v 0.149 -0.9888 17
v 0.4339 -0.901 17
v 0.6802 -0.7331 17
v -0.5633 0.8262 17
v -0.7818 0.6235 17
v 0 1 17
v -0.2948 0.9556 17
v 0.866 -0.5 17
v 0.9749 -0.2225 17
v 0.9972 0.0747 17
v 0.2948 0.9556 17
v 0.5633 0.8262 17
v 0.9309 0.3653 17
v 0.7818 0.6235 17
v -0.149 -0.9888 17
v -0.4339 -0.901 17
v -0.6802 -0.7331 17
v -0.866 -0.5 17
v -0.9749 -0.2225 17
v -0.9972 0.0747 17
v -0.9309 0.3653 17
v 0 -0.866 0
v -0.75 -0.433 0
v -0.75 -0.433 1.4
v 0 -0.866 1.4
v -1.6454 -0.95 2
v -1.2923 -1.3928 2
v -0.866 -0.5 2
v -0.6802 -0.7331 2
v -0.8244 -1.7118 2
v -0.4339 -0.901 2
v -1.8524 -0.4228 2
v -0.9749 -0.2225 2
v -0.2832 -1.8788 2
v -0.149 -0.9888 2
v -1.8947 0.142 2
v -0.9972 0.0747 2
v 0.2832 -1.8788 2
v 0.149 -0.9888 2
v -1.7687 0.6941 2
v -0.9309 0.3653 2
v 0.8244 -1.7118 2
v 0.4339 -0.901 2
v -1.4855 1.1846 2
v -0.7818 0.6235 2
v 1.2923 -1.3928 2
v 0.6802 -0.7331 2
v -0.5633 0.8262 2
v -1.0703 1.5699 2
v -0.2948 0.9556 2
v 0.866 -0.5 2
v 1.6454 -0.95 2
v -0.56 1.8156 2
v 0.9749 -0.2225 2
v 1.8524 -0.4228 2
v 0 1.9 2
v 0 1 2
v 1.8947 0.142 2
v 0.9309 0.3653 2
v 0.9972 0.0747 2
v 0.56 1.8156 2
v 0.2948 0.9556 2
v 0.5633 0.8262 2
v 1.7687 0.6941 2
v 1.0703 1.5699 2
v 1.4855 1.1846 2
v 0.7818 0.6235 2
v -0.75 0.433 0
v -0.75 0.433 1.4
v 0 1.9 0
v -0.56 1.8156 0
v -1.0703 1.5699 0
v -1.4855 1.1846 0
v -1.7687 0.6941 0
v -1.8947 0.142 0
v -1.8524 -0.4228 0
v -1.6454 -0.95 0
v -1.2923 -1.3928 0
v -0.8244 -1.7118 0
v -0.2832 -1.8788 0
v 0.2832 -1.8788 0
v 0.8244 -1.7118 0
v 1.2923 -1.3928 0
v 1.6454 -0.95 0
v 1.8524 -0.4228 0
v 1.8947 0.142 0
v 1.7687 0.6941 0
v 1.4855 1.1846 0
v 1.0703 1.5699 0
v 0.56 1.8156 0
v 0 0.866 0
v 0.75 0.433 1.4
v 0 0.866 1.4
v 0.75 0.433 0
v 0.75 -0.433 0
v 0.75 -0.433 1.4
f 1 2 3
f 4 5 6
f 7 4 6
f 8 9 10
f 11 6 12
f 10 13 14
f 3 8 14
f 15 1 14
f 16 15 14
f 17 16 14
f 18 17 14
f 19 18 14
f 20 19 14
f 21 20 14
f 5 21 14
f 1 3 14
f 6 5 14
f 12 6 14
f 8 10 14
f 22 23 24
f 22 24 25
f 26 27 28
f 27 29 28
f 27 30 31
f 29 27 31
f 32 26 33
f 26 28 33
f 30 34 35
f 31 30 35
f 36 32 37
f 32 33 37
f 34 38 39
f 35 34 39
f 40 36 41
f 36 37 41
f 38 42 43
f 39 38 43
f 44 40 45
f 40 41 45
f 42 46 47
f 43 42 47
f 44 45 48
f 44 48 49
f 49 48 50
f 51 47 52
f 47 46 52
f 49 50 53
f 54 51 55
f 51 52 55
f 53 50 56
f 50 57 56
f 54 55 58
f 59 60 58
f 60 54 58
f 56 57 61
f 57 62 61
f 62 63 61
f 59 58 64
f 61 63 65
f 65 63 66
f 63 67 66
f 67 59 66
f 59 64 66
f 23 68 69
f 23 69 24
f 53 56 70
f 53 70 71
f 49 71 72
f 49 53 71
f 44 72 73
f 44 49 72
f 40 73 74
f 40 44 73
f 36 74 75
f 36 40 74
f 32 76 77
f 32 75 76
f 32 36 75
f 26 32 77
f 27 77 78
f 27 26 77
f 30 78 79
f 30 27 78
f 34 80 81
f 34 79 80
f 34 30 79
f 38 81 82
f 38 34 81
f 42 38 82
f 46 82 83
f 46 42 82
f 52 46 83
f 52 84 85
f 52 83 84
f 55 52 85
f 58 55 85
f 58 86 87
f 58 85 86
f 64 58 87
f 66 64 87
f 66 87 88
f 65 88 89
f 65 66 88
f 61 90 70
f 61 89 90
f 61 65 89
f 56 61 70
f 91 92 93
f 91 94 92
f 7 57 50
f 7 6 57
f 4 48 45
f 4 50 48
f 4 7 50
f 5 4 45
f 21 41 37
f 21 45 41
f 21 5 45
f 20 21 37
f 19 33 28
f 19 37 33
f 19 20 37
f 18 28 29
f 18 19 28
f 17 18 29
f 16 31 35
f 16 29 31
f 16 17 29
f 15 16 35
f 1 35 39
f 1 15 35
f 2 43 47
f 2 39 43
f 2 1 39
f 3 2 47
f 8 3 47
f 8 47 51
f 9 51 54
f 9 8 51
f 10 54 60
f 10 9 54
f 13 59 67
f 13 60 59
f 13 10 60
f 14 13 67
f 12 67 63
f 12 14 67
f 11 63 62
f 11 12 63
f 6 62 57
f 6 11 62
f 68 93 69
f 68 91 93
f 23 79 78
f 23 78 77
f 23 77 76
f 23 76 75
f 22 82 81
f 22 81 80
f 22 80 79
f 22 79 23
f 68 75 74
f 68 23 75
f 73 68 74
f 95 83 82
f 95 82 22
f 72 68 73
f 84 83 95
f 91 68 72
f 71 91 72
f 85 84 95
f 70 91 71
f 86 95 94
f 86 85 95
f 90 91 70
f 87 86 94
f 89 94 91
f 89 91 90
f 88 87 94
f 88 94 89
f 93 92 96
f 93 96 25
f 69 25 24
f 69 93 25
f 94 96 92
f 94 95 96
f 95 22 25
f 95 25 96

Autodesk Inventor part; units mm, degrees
ref_plane "YZ Plane" through (0, 0, 0) normal (1, 0, 0) x (0, 1, 0)
ref_plane "XZ Plane" through (0, 0, 0) normal (0, 1, 0) x (-1, 0, 0)
ref_plane "XY Plane" through (0, 0, 0) normal (0, 0, 1) x (1, 0, 0)
sketch "スケッチ1" plane through (0, 0, 0) normal (1, 0, 0) x (0, 1, 0)
  line L0 (0, 17) -> (0, 0)
  line L1 (0, 0) -> (1.9, 0)
  line L2 (1.9, 0) -> (1.9, 2)
  line L3 (1.9, 2) -> (1, 2)
  line L4 (1, 2) -> (1, 17)
  line L5 (1, 17) -> (0, 17)
  dimension "d1" = 1
  dimension "d2" = 2
  dimension "d3" = 1.9
  dimension "d10" = 15
revolve "回転1" add sketch "スケッチ1" angle 360 about axis through (0, 0, 17) along (0, 0, -1)
thread "ねじ1" size "M2x0.4" class "6g" standard "ANSI Metric M Profile" full length
sketch "スケッチ2" plane through (0, 0, 0) normal (0, 0, -1) x (-1, 0, 0)
  line L0 (0, 0.866) -> (0.75, 0.433)
  line L1 (0.75, 0.433) -> (0.75, -0.433)
  line L2 (0.75, -0.433) -> (0, -0.866)
  line L3 (0, -0.866) -> (-0.75, -0.433)
  line L4 (-0.75, -0.433) -> (-0.75, 0.433)
  line L5 (-0.75, 0.433) -> (0, 0.866)
  line L6 (0, 1.9) -> (0, -1.9) construction
  point P0 (0, 0)
  point P1 (0, 0)
  dimension "d7" = 1.5
extrude "押し出し1" cut sketch "スケッチ2" against normal blind 1.4
properties part number "M2-15" material "ステンレス鋼 AISI 304"
